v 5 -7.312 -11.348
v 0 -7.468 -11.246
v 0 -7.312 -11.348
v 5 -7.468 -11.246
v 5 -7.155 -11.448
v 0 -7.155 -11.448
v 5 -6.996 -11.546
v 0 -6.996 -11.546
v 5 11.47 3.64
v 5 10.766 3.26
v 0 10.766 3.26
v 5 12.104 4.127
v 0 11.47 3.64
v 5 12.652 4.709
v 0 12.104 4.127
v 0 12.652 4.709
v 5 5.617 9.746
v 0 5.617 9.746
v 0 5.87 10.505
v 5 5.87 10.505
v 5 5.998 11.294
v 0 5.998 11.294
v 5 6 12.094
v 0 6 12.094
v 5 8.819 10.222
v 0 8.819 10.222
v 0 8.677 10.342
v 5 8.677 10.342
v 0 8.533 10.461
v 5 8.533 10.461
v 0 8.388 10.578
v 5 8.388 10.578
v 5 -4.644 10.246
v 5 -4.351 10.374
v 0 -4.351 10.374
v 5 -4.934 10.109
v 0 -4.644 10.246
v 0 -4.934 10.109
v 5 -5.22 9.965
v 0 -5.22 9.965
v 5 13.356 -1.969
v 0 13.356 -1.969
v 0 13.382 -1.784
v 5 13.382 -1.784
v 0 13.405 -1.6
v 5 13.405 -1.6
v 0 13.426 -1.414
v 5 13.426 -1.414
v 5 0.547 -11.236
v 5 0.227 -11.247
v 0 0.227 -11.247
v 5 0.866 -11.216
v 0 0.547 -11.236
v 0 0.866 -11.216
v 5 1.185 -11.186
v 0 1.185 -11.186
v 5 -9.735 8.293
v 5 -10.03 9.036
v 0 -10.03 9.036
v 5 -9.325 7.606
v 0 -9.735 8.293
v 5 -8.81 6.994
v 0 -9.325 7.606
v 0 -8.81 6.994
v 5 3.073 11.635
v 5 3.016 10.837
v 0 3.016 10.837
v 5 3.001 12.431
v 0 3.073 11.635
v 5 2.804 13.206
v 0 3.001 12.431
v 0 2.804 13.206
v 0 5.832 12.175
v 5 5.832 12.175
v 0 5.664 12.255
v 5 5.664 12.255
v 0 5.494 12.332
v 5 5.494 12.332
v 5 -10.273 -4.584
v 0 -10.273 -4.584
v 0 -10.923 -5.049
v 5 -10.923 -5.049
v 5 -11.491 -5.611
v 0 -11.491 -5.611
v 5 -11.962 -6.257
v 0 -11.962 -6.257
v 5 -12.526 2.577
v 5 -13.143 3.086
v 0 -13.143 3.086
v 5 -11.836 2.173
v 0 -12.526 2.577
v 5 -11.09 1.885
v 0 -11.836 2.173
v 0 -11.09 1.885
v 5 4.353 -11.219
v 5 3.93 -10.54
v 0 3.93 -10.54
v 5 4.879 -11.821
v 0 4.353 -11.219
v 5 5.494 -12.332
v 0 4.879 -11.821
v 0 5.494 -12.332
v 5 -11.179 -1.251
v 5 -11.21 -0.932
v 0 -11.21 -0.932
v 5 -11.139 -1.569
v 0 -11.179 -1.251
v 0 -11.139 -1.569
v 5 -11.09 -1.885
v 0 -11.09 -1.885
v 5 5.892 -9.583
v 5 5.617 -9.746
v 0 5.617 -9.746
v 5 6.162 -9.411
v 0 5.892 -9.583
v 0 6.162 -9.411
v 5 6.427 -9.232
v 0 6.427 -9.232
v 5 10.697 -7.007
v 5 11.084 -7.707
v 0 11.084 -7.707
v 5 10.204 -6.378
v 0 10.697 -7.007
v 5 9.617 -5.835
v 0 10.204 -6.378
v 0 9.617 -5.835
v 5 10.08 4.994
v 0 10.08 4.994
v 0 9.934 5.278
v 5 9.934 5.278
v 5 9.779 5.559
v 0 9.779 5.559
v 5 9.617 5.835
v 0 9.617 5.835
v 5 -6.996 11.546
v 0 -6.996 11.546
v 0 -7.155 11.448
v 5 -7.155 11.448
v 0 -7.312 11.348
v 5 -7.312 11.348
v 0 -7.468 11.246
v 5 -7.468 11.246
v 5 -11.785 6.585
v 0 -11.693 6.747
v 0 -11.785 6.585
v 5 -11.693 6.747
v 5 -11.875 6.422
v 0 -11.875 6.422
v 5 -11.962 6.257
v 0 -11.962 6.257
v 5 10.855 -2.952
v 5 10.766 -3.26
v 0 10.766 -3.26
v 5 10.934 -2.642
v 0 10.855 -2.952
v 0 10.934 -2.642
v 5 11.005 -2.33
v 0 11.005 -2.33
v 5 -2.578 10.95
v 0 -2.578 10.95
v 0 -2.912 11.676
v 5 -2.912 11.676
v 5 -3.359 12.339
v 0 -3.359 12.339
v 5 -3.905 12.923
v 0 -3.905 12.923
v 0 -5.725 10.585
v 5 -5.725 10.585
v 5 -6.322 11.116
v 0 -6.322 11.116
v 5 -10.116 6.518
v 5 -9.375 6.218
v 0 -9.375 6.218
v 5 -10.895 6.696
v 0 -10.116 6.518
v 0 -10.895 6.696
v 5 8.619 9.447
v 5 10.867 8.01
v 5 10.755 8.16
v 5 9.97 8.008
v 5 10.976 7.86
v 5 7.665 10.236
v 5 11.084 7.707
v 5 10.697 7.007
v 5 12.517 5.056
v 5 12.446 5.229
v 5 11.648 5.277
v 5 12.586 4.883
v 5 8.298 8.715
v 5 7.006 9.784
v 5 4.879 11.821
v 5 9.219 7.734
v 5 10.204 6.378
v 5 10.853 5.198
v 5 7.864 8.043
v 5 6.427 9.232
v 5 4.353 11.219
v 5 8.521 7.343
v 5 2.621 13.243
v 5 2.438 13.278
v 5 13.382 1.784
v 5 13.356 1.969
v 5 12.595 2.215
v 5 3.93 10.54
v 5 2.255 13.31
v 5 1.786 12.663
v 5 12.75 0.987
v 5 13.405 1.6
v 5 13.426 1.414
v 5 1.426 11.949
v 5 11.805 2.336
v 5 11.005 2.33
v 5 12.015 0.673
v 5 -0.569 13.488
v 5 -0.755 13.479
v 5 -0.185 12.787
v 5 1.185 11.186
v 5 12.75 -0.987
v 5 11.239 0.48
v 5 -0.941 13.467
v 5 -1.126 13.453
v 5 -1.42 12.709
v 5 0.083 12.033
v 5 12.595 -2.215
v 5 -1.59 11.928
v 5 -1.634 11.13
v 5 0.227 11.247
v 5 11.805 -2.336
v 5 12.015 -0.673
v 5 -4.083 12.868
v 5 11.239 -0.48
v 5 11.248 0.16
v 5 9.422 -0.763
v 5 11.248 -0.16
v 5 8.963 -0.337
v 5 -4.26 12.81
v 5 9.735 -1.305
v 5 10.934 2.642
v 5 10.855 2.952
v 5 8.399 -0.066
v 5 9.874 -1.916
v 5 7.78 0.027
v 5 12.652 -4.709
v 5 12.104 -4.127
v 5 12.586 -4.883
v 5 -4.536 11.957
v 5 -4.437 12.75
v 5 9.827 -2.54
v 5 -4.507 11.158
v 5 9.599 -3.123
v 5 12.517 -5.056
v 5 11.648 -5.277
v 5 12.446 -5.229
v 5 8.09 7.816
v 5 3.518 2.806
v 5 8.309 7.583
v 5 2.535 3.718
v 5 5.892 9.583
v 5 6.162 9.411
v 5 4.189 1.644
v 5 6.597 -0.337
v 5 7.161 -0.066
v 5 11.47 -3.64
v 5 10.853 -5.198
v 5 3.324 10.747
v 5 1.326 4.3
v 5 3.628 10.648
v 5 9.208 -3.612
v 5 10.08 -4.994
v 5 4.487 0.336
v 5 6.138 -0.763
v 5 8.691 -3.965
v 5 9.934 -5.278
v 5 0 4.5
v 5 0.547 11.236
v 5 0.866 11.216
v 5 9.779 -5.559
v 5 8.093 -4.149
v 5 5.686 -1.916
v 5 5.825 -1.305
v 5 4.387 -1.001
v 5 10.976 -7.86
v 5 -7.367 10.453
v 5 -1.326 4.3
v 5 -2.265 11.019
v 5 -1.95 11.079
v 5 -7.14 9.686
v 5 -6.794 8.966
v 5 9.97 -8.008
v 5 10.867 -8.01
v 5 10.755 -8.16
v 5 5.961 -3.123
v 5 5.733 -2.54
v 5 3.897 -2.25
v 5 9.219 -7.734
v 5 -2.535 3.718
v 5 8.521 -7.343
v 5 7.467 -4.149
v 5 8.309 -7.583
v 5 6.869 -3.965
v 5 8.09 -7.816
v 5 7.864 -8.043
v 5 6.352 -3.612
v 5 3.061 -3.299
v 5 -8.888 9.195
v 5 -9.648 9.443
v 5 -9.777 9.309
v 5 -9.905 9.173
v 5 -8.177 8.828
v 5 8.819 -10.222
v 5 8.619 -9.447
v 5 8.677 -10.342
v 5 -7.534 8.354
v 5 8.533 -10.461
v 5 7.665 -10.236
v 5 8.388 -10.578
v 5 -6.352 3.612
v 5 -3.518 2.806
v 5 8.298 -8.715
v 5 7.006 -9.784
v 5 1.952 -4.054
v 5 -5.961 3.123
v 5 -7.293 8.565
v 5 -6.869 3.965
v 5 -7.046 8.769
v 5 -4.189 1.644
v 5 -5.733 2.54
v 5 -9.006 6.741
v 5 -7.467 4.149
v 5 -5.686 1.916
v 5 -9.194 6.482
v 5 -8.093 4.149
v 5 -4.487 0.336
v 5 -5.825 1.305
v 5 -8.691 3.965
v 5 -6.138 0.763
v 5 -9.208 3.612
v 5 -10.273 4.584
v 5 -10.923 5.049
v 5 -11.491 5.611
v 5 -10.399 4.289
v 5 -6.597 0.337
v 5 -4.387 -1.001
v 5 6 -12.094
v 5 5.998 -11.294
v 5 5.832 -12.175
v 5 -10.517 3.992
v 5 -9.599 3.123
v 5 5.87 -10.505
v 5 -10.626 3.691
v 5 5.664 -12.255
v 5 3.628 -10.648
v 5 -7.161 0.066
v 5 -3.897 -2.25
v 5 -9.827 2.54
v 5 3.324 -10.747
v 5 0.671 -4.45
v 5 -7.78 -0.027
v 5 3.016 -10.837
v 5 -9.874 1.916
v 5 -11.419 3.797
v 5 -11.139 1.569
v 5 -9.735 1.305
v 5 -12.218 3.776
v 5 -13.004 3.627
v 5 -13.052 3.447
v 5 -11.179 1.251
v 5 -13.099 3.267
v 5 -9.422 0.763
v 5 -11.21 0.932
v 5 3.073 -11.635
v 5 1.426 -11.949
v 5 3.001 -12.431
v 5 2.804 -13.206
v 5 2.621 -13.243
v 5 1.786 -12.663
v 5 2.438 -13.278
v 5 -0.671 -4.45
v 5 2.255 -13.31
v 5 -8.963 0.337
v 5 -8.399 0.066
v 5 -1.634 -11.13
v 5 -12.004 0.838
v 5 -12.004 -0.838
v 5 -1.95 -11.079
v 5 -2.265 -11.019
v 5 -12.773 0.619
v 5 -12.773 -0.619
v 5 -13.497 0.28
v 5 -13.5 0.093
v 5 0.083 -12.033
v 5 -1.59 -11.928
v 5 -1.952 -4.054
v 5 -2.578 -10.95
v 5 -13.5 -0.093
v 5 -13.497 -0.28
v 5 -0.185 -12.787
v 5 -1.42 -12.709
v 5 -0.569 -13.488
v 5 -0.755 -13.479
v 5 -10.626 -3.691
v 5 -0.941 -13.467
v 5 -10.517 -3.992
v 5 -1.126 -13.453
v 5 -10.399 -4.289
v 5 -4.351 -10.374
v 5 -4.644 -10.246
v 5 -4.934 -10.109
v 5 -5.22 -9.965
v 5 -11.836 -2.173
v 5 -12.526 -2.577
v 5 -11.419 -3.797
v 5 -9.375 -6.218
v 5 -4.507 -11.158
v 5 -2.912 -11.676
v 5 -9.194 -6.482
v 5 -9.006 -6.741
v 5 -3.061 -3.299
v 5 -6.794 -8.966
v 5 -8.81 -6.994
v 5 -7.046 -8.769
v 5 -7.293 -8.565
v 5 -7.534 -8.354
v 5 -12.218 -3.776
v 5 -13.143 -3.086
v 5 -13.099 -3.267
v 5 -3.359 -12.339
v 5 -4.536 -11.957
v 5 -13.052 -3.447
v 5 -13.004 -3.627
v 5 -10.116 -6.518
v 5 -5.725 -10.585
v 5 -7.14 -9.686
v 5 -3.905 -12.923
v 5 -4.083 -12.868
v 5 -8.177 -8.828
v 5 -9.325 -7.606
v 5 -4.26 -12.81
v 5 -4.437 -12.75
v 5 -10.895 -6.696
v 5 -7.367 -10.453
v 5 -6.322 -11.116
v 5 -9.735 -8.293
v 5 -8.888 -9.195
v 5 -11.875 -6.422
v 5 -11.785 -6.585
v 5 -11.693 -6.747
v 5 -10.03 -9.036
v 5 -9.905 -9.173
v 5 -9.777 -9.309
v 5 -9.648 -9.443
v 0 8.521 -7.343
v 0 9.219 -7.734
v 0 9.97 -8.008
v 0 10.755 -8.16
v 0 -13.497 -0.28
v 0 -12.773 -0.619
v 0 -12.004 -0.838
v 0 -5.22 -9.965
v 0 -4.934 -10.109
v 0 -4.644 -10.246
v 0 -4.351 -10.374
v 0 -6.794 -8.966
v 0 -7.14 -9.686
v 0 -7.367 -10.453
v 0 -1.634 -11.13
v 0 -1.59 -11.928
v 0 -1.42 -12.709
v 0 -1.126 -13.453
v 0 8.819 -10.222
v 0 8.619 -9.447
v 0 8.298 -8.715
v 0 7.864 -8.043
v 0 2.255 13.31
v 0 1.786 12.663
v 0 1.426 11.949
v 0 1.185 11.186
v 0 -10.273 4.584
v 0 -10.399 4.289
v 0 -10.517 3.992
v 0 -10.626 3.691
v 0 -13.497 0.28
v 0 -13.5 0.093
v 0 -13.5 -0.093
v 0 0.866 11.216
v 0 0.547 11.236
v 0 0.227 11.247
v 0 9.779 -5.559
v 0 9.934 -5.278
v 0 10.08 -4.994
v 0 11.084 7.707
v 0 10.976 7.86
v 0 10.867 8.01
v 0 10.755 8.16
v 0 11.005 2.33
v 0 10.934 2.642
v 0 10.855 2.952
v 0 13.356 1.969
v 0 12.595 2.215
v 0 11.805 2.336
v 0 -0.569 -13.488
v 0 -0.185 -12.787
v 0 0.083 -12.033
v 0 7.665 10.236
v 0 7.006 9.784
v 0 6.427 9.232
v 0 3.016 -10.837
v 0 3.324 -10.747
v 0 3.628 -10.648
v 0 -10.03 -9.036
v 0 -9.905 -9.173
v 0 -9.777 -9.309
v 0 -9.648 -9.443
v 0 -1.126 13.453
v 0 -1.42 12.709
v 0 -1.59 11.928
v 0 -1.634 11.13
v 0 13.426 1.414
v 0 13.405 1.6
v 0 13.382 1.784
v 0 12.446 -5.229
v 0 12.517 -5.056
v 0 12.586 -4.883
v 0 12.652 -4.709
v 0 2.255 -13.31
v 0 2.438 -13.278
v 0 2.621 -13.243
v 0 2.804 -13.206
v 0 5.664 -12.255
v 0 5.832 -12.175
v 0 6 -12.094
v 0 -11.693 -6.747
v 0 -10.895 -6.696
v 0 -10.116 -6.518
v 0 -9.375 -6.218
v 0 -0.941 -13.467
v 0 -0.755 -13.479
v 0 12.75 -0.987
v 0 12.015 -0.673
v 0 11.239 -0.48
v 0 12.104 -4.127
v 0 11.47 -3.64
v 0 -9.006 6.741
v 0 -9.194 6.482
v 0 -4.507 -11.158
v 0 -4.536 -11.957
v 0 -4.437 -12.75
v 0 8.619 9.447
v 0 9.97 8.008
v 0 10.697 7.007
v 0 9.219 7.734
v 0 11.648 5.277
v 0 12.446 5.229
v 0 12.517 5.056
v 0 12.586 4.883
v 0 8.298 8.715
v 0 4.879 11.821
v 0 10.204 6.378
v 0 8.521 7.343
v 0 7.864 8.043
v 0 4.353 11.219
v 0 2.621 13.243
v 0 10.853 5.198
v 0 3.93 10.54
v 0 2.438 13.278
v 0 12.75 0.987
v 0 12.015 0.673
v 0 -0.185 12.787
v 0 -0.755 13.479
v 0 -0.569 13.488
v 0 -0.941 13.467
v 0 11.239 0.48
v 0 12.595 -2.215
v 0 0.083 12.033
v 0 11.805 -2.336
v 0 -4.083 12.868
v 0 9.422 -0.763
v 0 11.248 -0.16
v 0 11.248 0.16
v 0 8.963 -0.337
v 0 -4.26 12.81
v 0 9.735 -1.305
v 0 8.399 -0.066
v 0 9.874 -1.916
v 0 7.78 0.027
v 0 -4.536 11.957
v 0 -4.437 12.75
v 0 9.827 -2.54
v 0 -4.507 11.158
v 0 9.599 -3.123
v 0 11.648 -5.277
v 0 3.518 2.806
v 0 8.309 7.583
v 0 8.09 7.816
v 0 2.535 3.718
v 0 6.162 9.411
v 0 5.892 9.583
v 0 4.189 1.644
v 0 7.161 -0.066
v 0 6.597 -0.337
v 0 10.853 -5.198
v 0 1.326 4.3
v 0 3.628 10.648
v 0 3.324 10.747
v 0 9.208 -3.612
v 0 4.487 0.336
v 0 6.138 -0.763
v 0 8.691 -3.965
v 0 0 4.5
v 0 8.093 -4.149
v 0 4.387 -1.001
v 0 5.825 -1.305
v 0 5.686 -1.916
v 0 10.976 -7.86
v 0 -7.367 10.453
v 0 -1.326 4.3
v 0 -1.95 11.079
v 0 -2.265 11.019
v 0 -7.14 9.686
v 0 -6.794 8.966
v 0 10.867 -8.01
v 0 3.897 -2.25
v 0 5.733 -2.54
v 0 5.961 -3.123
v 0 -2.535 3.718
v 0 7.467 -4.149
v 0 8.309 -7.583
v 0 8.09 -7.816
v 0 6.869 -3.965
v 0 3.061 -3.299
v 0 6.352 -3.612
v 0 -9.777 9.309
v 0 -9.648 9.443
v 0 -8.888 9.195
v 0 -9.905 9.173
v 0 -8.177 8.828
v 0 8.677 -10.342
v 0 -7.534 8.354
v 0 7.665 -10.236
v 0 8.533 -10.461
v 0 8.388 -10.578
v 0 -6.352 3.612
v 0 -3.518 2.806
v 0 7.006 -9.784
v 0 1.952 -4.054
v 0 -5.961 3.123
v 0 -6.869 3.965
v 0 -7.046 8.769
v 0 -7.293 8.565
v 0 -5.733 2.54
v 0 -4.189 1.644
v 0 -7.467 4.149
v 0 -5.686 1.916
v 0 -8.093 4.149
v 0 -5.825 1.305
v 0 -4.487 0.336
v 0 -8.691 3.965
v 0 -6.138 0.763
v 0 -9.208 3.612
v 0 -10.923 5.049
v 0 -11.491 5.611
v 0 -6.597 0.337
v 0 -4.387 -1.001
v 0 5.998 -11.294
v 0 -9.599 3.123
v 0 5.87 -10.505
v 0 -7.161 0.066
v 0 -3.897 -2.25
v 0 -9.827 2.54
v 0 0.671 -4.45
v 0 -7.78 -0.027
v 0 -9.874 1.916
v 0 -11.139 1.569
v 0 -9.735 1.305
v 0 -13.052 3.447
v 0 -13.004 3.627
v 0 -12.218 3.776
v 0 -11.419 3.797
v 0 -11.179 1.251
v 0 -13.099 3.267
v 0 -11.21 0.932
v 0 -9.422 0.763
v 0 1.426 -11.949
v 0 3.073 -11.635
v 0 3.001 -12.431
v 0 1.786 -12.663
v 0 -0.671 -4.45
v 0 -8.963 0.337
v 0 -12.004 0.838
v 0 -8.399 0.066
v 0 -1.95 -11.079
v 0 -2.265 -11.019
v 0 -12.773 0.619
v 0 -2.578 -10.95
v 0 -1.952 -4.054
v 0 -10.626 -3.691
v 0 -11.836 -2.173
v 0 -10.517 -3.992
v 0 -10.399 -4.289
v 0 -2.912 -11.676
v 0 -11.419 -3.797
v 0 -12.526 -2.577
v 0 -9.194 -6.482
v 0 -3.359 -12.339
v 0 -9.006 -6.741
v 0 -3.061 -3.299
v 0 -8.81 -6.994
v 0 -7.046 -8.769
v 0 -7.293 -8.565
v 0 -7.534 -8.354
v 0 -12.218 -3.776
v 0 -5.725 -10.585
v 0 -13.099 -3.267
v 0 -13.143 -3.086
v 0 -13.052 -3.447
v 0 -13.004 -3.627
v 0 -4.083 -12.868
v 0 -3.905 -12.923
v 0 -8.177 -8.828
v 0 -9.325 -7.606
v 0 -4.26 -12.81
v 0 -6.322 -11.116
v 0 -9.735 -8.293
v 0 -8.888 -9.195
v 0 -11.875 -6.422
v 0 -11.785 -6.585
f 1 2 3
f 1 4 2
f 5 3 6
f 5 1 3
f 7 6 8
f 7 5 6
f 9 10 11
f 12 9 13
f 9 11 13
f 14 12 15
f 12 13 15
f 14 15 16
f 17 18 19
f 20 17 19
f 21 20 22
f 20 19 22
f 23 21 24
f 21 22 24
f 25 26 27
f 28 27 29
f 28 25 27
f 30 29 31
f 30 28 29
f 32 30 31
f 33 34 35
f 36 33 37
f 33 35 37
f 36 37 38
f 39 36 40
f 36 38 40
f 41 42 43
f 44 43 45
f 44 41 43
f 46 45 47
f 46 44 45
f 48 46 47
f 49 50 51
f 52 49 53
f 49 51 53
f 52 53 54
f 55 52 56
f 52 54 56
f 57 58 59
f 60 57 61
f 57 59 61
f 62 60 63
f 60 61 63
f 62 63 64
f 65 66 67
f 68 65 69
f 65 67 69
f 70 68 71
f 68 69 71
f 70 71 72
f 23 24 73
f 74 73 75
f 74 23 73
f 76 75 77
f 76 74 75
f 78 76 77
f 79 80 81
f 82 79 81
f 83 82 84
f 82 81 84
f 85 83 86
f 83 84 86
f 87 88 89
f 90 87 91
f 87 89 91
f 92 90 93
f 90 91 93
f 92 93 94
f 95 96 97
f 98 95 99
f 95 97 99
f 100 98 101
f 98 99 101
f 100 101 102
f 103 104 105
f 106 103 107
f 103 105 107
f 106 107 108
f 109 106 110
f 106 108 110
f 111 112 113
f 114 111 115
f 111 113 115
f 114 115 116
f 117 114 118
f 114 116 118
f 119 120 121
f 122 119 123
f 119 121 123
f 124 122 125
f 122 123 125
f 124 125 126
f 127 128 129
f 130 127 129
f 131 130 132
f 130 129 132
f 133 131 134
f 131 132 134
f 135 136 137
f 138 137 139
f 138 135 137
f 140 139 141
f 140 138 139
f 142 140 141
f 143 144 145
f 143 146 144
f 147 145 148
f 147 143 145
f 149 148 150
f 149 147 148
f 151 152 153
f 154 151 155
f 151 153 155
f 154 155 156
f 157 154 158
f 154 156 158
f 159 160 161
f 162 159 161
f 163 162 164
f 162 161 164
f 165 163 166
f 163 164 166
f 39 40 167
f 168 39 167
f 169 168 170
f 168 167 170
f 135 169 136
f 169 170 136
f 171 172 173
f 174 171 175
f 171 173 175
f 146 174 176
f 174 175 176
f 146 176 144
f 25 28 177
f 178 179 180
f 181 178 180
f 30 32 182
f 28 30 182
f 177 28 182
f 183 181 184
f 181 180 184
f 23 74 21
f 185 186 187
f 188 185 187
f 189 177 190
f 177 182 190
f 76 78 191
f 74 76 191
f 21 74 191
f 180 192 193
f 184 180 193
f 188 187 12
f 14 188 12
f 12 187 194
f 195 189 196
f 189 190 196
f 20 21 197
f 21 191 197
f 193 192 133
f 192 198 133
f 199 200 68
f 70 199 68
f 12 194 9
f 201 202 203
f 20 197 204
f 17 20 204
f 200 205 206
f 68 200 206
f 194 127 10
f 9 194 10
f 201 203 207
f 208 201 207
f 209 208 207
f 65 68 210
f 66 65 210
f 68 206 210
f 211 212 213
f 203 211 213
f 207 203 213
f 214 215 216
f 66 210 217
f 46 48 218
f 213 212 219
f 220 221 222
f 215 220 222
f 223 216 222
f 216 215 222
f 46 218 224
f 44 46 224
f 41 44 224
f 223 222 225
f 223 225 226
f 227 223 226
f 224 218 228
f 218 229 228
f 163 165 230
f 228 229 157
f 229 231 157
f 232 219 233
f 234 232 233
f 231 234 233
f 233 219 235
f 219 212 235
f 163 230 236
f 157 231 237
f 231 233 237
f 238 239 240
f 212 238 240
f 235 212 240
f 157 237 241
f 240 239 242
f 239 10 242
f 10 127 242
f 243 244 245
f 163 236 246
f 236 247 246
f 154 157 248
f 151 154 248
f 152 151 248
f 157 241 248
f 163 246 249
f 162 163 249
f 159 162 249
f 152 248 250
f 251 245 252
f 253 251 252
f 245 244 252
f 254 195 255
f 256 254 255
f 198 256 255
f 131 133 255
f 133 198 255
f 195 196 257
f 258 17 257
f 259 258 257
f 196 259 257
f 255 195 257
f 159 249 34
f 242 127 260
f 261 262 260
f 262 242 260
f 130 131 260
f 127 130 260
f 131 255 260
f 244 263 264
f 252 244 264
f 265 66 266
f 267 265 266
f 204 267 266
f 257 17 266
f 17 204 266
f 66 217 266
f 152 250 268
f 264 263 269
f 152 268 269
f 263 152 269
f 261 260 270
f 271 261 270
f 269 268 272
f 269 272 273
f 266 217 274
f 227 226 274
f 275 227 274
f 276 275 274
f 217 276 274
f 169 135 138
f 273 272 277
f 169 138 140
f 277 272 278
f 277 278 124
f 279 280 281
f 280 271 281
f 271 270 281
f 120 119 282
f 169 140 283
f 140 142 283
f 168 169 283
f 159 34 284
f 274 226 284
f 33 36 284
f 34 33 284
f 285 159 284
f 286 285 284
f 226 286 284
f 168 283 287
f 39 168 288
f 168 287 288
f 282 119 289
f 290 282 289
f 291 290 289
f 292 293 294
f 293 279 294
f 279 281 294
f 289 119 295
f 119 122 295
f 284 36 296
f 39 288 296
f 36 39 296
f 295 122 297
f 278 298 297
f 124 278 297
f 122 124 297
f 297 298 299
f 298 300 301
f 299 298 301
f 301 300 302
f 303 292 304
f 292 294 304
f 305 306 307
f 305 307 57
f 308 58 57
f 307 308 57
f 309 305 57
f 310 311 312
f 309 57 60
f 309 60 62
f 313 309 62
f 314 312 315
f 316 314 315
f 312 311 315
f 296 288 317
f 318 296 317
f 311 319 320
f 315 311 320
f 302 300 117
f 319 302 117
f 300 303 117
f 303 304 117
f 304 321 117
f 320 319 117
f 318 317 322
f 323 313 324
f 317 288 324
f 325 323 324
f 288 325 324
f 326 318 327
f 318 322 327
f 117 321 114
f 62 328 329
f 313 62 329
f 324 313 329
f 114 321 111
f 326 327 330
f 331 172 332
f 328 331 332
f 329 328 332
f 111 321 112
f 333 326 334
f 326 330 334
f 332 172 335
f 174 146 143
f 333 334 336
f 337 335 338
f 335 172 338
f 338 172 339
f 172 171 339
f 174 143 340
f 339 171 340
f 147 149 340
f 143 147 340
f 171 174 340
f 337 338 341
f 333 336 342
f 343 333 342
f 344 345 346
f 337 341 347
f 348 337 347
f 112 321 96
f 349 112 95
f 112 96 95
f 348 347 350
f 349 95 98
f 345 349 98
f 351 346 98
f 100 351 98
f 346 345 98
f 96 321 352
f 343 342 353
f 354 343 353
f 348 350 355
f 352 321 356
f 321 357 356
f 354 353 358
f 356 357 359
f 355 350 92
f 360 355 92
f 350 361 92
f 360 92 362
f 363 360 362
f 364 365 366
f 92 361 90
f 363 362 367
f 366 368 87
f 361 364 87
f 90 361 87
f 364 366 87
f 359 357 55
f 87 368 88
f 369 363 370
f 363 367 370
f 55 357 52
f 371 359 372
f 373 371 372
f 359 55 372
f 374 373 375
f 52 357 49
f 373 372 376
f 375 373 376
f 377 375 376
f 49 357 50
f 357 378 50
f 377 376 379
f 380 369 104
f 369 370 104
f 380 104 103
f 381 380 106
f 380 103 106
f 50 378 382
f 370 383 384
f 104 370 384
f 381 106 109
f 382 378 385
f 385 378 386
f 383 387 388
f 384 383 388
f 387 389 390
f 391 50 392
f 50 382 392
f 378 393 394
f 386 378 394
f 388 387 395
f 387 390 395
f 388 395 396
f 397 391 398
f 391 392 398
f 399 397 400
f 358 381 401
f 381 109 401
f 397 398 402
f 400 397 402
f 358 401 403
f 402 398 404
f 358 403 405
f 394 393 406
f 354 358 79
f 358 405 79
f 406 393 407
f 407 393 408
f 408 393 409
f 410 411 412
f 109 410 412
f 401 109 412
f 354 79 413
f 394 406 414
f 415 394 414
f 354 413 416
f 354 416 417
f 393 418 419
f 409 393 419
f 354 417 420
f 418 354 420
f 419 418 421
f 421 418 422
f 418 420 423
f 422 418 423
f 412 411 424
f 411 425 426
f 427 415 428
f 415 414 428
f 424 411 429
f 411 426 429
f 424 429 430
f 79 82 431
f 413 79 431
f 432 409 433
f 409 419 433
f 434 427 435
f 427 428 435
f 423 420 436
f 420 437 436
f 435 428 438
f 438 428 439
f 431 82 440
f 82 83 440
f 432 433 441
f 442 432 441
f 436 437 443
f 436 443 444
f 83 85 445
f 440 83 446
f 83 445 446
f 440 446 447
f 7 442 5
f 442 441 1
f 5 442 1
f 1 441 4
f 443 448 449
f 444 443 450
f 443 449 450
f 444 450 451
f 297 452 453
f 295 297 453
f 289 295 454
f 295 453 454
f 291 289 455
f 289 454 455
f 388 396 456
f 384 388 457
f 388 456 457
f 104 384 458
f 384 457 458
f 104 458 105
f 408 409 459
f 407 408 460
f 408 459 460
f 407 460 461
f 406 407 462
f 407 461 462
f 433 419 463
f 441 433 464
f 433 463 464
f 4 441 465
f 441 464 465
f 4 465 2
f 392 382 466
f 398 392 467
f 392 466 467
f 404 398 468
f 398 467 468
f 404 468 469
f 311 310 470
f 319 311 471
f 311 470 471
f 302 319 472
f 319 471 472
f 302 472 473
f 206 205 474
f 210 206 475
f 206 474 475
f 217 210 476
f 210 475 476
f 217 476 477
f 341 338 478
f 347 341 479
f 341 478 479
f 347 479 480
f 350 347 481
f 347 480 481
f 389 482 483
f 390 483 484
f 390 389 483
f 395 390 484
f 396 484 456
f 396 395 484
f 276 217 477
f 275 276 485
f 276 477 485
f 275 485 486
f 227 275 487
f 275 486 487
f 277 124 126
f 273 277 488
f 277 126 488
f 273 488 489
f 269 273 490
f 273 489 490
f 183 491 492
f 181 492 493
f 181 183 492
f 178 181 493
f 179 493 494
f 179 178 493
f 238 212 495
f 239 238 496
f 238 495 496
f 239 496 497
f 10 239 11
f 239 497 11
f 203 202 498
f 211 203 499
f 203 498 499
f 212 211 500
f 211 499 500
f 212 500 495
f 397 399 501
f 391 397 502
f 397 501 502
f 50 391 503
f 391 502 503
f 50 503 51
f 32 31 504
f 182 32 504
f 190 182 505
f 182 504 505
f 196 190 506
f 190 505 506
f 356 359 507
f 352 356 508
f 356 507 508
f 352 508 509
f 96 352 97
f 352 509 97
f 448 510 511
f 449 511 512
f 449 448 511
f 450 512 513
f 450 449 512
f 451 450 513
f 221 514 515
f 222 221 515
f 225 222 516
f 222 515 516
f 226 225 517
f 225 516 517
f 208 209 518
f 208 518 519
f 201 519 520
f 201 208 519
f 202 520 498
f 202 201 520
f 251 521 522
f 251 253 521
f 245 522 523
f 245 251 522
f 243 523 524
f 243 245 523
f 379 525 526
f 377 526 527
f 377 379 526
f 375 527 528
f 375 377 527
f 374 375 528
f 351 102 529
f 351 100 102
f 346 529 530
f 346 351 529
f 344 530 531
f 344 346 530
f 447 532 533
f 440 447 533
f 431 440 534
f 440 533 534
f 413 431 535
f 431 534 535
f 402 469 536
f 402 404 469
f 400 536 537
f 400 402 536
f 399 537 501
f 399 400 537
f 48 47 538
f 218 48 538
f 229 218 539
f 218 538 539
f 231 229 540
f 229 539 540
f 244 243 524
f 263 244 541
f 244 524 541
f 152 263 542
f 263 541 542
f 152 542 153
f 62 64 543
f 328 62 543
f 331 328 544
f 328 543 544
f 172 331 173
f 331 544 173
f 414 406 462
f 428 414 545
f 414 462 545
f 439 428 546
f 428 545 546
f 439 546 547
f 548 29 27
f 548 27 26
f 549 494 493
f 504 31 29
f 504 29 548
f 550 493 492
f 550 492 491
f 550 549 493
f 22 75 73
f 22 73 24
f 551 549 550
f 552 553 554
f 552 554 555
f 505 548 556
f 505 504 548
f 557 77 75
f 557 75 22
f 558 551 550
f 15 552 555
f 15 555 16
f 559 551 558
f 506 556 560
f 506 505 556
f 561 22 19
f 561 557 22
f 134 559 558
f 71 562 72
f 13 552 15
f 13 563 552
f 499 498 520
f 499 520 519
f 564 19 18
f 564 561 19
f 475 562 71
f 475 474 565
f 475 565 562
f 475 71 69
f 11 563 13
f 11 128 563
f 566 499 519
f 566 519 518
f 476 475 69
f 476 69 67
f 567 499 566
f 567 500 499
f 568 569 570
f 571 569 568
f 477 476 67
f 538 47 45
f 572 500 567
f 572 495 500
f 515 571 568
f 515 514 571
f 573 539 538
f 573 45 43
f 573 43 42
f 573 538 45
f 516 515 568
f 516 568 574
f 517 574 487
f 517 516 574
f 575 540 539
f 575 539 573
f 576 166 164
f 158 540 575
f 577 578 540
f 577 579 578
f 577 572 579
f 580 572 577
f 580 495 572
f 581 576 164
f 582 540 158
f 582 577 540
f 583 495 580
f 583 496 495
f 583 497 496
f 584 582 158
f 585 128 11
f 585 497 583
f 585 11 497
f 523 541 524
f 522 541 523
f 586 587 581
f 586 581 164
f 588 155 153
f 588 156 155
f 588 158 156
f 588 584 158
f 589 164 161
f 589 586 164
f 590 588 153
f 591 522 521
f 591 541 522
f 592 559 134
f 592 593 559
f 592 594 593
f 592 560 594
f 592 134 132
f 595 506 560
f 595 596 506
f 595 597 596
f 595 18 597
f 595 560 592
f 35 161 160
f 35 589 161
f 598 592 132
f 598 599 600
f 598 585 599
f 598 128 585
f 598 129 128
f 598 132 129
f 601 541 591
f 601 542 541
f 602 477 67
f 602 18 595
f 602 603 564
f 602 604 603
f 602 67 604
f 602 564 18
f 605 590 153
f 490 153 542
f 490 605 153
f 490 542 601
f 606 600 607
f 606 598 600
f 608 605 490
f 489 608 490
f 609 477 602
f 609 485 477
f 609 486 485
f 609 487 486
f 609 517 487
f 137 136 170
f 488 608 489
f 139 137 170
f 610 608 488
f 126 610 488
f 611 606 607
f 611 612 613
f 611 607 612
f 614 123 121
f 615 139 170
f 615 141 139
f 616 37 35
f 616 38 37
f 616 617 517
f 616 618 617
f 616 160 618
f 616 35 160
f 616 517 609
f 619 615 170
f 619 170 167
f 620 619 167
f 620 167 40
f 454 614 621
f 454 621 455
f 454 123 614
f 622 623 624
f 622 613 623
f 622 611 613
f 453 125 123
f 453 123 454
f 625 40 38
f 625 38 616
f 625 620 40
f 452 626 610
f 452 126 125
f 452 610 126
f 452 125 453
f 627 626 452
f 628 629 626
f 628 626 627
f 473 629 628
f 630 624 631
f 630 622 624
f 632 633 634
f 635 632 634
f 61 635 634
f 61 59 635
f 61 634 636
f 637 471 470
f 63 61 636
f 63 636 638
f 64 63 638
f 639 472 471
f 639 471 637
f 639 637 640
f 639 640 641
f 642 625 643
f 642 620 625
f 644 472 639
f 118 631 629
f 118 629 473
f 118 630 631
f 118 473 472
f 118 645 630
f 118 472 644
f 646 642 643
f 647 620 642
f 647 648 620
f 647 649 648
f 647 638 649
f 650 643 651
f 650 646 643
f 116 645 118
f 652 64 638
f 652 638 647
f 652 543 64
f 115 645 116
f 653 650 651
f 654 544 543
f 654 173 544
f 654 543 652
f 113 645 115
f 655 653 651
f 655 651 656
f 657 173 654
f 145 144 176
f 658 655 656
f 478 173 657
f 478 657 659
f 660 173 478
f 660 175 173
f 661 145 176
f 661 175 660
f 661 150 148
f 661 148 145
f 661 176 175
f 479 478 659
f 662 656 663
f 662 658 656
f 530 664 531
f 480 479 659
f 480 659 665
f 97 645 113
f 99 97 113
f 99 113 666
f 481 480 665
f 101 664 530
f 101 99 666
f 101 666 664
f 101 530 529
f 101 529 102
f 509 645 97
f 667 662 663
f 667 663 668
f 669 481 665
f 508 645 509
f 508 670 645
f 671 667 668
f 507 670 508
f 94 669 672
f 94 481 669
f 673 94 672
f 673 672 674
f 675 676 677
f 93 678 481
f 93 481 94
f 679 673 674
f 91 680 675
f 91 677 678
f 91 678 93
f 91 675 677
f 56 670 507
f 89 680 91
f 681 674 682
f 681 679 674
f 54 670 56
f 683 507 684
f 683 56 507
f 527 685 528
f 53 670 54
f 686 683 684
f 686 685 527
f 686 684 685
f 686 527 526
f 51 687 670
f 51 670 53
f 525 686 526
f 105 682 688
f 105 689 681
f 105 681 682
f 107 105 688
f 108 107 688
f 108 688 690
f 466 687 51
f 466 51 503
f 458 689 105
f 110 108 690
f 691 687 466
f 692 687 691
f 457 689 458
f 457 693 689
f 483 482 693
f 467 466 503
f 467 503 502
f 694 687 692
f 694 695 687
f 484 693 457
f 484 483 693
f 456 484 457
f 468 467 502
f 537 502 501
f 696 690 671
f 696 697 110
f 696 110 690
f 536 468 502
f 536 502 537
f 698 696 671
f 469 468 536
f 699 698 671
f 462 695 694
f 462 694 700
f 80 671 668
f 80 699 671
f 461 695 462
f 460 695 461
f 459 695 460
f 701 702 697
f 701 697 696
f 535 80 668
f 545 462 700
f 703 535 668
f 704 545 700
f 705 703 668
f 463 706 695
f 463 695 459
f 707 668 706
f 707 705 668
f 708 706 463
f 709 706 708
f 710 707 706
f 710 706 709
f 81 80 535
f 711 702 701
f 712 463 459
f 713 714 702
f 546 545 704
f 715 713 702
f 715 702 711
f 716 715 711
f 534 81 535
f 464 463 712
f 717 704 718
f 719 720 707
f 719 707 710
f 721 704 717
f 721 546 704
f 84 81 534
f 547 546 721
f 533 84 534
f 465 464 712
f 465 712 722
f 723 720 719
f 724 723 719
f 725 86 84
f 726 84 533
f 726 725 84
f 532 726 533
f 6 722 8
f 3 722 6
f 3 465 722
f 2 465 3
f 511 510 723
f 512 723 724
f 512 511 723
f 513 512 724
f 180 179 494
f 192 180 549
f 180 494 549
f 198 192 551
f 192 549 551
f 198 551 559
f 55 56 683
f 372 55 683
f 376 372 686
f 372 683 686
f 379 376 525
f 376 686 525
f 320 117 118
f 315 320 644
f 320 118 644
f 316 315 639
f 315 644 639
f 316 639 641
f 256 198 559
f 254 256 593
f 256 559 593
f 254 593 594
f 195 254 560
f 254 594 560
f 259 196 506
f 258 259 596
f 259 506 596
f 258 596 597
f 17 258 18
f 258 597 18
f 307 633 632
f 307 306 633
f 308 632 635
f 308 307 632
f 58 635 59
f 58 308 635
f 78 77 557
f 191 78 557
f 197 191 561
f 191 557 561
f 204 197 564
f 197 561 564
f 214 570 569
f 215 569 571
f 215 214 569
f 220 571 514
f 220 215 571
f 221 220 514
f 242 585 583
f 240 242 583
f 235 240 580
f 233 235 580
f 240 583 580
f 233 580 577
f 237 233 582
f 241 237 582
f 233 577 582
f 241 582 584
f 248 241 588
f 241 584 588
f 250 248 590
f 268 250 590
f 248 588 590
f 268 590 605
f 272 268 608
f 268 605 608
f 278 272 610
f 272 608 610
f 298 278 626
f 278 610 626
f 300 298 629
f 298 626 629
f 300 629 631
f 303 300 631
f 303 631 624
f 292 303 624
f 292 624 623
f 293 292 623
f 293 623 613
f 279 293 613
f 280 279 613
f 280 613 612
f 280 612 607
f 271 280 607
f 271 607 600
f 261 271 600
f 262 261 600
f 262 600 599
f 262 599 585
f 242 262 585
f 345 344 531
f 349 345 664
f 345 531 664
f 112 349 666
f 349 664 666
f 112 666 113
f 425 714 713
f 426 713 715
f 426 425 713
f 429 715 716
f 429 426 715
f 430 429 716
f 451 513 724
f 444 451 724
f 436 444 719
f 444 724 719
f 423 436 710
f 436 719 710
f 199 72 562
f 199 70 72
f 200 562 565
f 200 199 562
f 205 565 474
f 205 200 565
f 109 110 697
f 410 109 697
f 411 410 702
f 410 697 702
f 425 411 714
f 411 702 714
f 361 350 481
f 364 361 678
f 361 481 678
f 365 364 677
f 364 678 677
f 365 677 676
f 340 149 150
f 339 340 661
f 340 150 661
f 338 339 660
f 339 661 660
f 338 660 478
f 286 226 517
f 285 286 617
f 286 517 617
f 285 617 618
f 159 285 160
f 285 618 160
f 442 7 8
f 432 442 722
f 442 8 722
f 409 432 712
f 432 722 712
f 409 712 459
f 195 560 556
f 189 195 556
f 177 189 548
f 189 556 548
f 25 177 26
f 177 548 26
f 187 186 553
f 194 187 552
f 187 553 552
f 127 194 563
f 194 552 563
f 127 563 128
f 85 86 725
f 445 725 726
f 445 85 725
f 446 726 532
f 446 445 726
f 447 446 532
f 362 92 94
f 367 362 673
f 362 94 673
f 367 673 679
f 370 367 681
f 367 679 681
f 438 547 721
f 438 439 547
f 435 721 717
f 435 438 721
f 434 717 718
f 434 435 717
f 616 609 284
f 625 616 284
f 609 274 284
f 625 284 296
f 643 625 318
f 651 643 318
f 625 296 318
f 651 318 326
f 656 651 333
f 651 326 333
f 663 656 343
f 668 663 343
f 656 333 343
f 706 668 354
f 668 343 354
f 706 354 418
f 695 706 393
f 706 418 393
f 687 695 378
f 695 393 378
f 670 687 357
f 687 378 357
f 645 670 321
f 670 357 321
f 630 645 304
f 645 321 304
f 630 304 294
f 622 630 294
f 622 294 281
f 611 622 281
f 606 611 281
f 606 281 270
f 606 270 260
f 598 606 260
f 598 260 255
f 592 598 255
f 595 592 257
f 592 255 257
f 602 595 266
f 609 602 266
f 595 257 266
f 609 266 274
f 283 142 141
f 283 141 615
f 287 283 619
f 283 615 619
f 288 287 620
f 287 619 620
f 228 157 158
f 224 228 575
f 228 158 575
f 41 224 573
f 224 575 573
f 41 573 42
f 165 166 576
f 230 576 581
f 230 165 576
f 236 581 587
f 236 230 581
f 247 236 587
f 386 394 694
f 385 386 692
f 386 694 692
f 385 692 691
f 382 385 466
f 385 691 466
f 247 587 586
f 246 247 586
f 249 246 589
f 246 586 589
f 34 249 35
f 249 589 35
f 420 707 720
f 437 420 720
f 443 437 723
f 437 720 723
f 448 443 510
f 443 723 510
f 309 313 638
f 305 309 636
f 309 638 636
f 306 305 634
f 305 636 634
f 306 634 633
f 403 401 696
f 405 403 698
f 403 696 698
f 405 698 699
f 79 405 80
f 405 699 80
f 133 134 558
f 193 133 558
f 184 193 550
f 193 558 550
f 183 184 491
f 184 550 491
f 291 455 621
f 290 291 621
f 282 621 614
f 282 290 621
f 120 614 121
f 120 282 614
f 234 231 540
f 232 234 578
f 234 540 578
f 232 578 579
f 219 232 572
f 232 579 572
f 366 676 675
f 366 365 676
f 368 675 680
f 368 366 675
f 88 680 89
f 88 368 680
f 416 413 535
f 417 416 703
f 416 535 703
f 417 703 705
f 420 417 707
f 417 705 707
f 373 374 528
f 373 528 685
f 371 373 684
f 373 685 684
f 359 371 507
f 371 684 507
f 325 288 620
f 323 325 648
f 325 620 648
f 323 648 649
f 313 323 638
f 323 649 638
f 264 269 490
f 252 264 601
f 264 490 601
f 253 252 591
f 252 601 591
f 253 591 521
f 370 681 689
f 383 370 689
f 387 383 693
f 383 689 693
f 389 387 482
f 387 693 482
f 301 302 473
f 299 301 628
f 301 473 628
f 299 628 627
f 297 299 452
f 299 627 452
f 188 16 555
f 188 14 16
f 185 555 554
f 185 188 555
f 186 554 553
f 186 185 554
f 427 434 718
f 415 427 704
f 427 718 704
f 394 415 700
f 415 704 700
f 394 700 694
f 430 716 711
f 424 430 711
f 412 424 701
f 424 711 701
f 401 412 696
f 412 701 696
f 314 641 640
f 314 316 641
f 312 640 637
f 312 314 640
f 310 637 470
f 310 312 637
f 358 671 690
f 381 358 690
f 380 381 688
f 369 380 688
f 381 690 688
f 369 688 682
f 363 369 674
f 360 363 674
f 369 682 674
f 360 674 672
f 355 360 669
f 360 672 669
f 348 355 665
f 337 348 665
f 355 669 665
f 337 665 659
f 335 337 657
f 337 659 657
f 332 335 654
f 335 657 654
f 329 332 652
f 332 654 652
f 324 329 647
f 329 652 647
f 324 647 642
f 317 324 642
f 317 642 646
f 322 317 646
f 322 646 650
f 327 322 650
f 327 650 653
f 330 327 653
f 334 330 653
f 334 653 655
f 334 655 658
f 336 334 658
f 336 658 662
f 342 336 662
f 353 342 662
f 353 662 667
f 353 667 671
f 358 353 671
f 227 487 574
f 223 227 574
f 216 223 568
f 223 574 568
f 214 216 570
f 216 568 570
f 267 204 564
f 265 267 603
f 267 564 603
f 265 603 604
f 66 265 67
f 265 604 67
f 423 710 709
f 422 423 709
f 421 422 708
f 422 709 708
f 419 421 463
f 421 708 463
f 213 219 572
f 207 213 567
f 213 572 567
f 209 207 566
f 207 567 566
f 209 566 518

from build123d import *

# Parameters (mm, degrees)
BASPROSKE_W                  = 5
BASPROSKE_H                  = 13.5
TOOTHCUT_DEPTH               = 20.735754356
TEETHCUTS_COUNT              = 25
TEETHCUTS_ANGLE              = 345.6
BORSKE_R                     = 4.5
BORE_DEPTH                   = 50.0000508
ESQUISSE3_R                  = 2.1
ENL_V_MAT_EXTRU_1_DEPTH      = 20.727564352
R_P_TITION_CIRCULAIRE1_COUNT = 2


with BuildPart() as part:
    # BasProSke → Base-Revolve (revolve)
    with BuildSketch(Plane(origin=(0, 0, 0), x_dir=(1, 0, 0), z_dir=(0, 1, 0)), mode=Mode.PRIVATE) as base_revolve_sk:
        with Locations((2.5, 6.75)):
            Rectangle(BASPROSKE_W, BASPROSKE_H)
    revolve(base_revolve_sk.sketch.rotate(Axis((-10, 0, 0), (1, 0, 0)), 180), axis=Axis((-10, 0, 0), (1, 0, 0)))

    # TooCutSke → ToothCut (cut, through all)
    with BuildSketch(Plane(origin=(0, 0, 0), x_dir=(0, 0, -1), z_dir=(1, 0, 0))):
        with BuildLine():
            ThreePointArc((0.480087995, 11.238750665), (0, 11.249), (-0.480087995, 11.238750665))
            ThreePointArc((-0.480087995, 11.238750665), (-0.821124963, 12.40220054), (-1.432168974, 13.449361962))
            ThreePointArc((-1.432168974, 13.449361962), (0, 13.5254), (1.432168974, 13.449361962))
            ThreePointArc((1.432168974, 13.449361962), (0.821124963, 12.40220054), (0.480087995, 11.238750665))
        make_face()
    toothcut = extrude(amount=TOOTHCUT_DEPTH, mode=Mode.SUBTRACT)

    # TeethCuts: ToothCut ×25 about axis
    teethcuts_axis = Axis((-10, 0, 0), (1, 0, 0))
    for i in range(1, TEETHCUTS_COUNT):
        add(toothcut.rotate(teethcuts_axis, i * TEETHCUTS_ANGLE / (TEETHCUTS_COUNT - 1)), mode=Mode.SUBTRACT)

    # BorSke → Bore (cut, symmetric)
    with BuildSketch(Plane(origin=(0, 0, 0), x_dir=(0, 0, -1), z_dir=(1, 0, 0))):
        with Locations(Location((0, 0, 0), (0, 0, 180))):
            Circle(BORSKE_R)
    extrude(amount=BORE_DEPTH, both=True, mode=Mode.SUBTRACT)

    # Esquisse3 → Enlèv. mat.-Extru.1 (cut, through all)
    with BuildSketch(Plane.ZY):
        with Locations((-2.072553705, 7.78)):
            Circle(ESQUISSE3_R)
    enl_v_mat_extru_1 = extrude(amount=-ENL_V_MAT_EXTRU_1_DEPTH, mode=Mode.SUBTRACT)

    # Répétition circulaire1: Enlèv. mat.-Extru.1 ×2 about axis
    r_p_tition_circulaire1_axis = Axis((0, 0, 0), (1, 0, 0))
    for i in range(1, R_P_TITION_CIRCULAIRE1_COUNT):
        add(enl_v_mat_extru_1.rotate(r_p_tition_circulaire1_axis, i * 360 / R_P_TITION_CIRCULAIRE1_COUNT), mode=Mode.SUBTRACT)


solid = part.part
